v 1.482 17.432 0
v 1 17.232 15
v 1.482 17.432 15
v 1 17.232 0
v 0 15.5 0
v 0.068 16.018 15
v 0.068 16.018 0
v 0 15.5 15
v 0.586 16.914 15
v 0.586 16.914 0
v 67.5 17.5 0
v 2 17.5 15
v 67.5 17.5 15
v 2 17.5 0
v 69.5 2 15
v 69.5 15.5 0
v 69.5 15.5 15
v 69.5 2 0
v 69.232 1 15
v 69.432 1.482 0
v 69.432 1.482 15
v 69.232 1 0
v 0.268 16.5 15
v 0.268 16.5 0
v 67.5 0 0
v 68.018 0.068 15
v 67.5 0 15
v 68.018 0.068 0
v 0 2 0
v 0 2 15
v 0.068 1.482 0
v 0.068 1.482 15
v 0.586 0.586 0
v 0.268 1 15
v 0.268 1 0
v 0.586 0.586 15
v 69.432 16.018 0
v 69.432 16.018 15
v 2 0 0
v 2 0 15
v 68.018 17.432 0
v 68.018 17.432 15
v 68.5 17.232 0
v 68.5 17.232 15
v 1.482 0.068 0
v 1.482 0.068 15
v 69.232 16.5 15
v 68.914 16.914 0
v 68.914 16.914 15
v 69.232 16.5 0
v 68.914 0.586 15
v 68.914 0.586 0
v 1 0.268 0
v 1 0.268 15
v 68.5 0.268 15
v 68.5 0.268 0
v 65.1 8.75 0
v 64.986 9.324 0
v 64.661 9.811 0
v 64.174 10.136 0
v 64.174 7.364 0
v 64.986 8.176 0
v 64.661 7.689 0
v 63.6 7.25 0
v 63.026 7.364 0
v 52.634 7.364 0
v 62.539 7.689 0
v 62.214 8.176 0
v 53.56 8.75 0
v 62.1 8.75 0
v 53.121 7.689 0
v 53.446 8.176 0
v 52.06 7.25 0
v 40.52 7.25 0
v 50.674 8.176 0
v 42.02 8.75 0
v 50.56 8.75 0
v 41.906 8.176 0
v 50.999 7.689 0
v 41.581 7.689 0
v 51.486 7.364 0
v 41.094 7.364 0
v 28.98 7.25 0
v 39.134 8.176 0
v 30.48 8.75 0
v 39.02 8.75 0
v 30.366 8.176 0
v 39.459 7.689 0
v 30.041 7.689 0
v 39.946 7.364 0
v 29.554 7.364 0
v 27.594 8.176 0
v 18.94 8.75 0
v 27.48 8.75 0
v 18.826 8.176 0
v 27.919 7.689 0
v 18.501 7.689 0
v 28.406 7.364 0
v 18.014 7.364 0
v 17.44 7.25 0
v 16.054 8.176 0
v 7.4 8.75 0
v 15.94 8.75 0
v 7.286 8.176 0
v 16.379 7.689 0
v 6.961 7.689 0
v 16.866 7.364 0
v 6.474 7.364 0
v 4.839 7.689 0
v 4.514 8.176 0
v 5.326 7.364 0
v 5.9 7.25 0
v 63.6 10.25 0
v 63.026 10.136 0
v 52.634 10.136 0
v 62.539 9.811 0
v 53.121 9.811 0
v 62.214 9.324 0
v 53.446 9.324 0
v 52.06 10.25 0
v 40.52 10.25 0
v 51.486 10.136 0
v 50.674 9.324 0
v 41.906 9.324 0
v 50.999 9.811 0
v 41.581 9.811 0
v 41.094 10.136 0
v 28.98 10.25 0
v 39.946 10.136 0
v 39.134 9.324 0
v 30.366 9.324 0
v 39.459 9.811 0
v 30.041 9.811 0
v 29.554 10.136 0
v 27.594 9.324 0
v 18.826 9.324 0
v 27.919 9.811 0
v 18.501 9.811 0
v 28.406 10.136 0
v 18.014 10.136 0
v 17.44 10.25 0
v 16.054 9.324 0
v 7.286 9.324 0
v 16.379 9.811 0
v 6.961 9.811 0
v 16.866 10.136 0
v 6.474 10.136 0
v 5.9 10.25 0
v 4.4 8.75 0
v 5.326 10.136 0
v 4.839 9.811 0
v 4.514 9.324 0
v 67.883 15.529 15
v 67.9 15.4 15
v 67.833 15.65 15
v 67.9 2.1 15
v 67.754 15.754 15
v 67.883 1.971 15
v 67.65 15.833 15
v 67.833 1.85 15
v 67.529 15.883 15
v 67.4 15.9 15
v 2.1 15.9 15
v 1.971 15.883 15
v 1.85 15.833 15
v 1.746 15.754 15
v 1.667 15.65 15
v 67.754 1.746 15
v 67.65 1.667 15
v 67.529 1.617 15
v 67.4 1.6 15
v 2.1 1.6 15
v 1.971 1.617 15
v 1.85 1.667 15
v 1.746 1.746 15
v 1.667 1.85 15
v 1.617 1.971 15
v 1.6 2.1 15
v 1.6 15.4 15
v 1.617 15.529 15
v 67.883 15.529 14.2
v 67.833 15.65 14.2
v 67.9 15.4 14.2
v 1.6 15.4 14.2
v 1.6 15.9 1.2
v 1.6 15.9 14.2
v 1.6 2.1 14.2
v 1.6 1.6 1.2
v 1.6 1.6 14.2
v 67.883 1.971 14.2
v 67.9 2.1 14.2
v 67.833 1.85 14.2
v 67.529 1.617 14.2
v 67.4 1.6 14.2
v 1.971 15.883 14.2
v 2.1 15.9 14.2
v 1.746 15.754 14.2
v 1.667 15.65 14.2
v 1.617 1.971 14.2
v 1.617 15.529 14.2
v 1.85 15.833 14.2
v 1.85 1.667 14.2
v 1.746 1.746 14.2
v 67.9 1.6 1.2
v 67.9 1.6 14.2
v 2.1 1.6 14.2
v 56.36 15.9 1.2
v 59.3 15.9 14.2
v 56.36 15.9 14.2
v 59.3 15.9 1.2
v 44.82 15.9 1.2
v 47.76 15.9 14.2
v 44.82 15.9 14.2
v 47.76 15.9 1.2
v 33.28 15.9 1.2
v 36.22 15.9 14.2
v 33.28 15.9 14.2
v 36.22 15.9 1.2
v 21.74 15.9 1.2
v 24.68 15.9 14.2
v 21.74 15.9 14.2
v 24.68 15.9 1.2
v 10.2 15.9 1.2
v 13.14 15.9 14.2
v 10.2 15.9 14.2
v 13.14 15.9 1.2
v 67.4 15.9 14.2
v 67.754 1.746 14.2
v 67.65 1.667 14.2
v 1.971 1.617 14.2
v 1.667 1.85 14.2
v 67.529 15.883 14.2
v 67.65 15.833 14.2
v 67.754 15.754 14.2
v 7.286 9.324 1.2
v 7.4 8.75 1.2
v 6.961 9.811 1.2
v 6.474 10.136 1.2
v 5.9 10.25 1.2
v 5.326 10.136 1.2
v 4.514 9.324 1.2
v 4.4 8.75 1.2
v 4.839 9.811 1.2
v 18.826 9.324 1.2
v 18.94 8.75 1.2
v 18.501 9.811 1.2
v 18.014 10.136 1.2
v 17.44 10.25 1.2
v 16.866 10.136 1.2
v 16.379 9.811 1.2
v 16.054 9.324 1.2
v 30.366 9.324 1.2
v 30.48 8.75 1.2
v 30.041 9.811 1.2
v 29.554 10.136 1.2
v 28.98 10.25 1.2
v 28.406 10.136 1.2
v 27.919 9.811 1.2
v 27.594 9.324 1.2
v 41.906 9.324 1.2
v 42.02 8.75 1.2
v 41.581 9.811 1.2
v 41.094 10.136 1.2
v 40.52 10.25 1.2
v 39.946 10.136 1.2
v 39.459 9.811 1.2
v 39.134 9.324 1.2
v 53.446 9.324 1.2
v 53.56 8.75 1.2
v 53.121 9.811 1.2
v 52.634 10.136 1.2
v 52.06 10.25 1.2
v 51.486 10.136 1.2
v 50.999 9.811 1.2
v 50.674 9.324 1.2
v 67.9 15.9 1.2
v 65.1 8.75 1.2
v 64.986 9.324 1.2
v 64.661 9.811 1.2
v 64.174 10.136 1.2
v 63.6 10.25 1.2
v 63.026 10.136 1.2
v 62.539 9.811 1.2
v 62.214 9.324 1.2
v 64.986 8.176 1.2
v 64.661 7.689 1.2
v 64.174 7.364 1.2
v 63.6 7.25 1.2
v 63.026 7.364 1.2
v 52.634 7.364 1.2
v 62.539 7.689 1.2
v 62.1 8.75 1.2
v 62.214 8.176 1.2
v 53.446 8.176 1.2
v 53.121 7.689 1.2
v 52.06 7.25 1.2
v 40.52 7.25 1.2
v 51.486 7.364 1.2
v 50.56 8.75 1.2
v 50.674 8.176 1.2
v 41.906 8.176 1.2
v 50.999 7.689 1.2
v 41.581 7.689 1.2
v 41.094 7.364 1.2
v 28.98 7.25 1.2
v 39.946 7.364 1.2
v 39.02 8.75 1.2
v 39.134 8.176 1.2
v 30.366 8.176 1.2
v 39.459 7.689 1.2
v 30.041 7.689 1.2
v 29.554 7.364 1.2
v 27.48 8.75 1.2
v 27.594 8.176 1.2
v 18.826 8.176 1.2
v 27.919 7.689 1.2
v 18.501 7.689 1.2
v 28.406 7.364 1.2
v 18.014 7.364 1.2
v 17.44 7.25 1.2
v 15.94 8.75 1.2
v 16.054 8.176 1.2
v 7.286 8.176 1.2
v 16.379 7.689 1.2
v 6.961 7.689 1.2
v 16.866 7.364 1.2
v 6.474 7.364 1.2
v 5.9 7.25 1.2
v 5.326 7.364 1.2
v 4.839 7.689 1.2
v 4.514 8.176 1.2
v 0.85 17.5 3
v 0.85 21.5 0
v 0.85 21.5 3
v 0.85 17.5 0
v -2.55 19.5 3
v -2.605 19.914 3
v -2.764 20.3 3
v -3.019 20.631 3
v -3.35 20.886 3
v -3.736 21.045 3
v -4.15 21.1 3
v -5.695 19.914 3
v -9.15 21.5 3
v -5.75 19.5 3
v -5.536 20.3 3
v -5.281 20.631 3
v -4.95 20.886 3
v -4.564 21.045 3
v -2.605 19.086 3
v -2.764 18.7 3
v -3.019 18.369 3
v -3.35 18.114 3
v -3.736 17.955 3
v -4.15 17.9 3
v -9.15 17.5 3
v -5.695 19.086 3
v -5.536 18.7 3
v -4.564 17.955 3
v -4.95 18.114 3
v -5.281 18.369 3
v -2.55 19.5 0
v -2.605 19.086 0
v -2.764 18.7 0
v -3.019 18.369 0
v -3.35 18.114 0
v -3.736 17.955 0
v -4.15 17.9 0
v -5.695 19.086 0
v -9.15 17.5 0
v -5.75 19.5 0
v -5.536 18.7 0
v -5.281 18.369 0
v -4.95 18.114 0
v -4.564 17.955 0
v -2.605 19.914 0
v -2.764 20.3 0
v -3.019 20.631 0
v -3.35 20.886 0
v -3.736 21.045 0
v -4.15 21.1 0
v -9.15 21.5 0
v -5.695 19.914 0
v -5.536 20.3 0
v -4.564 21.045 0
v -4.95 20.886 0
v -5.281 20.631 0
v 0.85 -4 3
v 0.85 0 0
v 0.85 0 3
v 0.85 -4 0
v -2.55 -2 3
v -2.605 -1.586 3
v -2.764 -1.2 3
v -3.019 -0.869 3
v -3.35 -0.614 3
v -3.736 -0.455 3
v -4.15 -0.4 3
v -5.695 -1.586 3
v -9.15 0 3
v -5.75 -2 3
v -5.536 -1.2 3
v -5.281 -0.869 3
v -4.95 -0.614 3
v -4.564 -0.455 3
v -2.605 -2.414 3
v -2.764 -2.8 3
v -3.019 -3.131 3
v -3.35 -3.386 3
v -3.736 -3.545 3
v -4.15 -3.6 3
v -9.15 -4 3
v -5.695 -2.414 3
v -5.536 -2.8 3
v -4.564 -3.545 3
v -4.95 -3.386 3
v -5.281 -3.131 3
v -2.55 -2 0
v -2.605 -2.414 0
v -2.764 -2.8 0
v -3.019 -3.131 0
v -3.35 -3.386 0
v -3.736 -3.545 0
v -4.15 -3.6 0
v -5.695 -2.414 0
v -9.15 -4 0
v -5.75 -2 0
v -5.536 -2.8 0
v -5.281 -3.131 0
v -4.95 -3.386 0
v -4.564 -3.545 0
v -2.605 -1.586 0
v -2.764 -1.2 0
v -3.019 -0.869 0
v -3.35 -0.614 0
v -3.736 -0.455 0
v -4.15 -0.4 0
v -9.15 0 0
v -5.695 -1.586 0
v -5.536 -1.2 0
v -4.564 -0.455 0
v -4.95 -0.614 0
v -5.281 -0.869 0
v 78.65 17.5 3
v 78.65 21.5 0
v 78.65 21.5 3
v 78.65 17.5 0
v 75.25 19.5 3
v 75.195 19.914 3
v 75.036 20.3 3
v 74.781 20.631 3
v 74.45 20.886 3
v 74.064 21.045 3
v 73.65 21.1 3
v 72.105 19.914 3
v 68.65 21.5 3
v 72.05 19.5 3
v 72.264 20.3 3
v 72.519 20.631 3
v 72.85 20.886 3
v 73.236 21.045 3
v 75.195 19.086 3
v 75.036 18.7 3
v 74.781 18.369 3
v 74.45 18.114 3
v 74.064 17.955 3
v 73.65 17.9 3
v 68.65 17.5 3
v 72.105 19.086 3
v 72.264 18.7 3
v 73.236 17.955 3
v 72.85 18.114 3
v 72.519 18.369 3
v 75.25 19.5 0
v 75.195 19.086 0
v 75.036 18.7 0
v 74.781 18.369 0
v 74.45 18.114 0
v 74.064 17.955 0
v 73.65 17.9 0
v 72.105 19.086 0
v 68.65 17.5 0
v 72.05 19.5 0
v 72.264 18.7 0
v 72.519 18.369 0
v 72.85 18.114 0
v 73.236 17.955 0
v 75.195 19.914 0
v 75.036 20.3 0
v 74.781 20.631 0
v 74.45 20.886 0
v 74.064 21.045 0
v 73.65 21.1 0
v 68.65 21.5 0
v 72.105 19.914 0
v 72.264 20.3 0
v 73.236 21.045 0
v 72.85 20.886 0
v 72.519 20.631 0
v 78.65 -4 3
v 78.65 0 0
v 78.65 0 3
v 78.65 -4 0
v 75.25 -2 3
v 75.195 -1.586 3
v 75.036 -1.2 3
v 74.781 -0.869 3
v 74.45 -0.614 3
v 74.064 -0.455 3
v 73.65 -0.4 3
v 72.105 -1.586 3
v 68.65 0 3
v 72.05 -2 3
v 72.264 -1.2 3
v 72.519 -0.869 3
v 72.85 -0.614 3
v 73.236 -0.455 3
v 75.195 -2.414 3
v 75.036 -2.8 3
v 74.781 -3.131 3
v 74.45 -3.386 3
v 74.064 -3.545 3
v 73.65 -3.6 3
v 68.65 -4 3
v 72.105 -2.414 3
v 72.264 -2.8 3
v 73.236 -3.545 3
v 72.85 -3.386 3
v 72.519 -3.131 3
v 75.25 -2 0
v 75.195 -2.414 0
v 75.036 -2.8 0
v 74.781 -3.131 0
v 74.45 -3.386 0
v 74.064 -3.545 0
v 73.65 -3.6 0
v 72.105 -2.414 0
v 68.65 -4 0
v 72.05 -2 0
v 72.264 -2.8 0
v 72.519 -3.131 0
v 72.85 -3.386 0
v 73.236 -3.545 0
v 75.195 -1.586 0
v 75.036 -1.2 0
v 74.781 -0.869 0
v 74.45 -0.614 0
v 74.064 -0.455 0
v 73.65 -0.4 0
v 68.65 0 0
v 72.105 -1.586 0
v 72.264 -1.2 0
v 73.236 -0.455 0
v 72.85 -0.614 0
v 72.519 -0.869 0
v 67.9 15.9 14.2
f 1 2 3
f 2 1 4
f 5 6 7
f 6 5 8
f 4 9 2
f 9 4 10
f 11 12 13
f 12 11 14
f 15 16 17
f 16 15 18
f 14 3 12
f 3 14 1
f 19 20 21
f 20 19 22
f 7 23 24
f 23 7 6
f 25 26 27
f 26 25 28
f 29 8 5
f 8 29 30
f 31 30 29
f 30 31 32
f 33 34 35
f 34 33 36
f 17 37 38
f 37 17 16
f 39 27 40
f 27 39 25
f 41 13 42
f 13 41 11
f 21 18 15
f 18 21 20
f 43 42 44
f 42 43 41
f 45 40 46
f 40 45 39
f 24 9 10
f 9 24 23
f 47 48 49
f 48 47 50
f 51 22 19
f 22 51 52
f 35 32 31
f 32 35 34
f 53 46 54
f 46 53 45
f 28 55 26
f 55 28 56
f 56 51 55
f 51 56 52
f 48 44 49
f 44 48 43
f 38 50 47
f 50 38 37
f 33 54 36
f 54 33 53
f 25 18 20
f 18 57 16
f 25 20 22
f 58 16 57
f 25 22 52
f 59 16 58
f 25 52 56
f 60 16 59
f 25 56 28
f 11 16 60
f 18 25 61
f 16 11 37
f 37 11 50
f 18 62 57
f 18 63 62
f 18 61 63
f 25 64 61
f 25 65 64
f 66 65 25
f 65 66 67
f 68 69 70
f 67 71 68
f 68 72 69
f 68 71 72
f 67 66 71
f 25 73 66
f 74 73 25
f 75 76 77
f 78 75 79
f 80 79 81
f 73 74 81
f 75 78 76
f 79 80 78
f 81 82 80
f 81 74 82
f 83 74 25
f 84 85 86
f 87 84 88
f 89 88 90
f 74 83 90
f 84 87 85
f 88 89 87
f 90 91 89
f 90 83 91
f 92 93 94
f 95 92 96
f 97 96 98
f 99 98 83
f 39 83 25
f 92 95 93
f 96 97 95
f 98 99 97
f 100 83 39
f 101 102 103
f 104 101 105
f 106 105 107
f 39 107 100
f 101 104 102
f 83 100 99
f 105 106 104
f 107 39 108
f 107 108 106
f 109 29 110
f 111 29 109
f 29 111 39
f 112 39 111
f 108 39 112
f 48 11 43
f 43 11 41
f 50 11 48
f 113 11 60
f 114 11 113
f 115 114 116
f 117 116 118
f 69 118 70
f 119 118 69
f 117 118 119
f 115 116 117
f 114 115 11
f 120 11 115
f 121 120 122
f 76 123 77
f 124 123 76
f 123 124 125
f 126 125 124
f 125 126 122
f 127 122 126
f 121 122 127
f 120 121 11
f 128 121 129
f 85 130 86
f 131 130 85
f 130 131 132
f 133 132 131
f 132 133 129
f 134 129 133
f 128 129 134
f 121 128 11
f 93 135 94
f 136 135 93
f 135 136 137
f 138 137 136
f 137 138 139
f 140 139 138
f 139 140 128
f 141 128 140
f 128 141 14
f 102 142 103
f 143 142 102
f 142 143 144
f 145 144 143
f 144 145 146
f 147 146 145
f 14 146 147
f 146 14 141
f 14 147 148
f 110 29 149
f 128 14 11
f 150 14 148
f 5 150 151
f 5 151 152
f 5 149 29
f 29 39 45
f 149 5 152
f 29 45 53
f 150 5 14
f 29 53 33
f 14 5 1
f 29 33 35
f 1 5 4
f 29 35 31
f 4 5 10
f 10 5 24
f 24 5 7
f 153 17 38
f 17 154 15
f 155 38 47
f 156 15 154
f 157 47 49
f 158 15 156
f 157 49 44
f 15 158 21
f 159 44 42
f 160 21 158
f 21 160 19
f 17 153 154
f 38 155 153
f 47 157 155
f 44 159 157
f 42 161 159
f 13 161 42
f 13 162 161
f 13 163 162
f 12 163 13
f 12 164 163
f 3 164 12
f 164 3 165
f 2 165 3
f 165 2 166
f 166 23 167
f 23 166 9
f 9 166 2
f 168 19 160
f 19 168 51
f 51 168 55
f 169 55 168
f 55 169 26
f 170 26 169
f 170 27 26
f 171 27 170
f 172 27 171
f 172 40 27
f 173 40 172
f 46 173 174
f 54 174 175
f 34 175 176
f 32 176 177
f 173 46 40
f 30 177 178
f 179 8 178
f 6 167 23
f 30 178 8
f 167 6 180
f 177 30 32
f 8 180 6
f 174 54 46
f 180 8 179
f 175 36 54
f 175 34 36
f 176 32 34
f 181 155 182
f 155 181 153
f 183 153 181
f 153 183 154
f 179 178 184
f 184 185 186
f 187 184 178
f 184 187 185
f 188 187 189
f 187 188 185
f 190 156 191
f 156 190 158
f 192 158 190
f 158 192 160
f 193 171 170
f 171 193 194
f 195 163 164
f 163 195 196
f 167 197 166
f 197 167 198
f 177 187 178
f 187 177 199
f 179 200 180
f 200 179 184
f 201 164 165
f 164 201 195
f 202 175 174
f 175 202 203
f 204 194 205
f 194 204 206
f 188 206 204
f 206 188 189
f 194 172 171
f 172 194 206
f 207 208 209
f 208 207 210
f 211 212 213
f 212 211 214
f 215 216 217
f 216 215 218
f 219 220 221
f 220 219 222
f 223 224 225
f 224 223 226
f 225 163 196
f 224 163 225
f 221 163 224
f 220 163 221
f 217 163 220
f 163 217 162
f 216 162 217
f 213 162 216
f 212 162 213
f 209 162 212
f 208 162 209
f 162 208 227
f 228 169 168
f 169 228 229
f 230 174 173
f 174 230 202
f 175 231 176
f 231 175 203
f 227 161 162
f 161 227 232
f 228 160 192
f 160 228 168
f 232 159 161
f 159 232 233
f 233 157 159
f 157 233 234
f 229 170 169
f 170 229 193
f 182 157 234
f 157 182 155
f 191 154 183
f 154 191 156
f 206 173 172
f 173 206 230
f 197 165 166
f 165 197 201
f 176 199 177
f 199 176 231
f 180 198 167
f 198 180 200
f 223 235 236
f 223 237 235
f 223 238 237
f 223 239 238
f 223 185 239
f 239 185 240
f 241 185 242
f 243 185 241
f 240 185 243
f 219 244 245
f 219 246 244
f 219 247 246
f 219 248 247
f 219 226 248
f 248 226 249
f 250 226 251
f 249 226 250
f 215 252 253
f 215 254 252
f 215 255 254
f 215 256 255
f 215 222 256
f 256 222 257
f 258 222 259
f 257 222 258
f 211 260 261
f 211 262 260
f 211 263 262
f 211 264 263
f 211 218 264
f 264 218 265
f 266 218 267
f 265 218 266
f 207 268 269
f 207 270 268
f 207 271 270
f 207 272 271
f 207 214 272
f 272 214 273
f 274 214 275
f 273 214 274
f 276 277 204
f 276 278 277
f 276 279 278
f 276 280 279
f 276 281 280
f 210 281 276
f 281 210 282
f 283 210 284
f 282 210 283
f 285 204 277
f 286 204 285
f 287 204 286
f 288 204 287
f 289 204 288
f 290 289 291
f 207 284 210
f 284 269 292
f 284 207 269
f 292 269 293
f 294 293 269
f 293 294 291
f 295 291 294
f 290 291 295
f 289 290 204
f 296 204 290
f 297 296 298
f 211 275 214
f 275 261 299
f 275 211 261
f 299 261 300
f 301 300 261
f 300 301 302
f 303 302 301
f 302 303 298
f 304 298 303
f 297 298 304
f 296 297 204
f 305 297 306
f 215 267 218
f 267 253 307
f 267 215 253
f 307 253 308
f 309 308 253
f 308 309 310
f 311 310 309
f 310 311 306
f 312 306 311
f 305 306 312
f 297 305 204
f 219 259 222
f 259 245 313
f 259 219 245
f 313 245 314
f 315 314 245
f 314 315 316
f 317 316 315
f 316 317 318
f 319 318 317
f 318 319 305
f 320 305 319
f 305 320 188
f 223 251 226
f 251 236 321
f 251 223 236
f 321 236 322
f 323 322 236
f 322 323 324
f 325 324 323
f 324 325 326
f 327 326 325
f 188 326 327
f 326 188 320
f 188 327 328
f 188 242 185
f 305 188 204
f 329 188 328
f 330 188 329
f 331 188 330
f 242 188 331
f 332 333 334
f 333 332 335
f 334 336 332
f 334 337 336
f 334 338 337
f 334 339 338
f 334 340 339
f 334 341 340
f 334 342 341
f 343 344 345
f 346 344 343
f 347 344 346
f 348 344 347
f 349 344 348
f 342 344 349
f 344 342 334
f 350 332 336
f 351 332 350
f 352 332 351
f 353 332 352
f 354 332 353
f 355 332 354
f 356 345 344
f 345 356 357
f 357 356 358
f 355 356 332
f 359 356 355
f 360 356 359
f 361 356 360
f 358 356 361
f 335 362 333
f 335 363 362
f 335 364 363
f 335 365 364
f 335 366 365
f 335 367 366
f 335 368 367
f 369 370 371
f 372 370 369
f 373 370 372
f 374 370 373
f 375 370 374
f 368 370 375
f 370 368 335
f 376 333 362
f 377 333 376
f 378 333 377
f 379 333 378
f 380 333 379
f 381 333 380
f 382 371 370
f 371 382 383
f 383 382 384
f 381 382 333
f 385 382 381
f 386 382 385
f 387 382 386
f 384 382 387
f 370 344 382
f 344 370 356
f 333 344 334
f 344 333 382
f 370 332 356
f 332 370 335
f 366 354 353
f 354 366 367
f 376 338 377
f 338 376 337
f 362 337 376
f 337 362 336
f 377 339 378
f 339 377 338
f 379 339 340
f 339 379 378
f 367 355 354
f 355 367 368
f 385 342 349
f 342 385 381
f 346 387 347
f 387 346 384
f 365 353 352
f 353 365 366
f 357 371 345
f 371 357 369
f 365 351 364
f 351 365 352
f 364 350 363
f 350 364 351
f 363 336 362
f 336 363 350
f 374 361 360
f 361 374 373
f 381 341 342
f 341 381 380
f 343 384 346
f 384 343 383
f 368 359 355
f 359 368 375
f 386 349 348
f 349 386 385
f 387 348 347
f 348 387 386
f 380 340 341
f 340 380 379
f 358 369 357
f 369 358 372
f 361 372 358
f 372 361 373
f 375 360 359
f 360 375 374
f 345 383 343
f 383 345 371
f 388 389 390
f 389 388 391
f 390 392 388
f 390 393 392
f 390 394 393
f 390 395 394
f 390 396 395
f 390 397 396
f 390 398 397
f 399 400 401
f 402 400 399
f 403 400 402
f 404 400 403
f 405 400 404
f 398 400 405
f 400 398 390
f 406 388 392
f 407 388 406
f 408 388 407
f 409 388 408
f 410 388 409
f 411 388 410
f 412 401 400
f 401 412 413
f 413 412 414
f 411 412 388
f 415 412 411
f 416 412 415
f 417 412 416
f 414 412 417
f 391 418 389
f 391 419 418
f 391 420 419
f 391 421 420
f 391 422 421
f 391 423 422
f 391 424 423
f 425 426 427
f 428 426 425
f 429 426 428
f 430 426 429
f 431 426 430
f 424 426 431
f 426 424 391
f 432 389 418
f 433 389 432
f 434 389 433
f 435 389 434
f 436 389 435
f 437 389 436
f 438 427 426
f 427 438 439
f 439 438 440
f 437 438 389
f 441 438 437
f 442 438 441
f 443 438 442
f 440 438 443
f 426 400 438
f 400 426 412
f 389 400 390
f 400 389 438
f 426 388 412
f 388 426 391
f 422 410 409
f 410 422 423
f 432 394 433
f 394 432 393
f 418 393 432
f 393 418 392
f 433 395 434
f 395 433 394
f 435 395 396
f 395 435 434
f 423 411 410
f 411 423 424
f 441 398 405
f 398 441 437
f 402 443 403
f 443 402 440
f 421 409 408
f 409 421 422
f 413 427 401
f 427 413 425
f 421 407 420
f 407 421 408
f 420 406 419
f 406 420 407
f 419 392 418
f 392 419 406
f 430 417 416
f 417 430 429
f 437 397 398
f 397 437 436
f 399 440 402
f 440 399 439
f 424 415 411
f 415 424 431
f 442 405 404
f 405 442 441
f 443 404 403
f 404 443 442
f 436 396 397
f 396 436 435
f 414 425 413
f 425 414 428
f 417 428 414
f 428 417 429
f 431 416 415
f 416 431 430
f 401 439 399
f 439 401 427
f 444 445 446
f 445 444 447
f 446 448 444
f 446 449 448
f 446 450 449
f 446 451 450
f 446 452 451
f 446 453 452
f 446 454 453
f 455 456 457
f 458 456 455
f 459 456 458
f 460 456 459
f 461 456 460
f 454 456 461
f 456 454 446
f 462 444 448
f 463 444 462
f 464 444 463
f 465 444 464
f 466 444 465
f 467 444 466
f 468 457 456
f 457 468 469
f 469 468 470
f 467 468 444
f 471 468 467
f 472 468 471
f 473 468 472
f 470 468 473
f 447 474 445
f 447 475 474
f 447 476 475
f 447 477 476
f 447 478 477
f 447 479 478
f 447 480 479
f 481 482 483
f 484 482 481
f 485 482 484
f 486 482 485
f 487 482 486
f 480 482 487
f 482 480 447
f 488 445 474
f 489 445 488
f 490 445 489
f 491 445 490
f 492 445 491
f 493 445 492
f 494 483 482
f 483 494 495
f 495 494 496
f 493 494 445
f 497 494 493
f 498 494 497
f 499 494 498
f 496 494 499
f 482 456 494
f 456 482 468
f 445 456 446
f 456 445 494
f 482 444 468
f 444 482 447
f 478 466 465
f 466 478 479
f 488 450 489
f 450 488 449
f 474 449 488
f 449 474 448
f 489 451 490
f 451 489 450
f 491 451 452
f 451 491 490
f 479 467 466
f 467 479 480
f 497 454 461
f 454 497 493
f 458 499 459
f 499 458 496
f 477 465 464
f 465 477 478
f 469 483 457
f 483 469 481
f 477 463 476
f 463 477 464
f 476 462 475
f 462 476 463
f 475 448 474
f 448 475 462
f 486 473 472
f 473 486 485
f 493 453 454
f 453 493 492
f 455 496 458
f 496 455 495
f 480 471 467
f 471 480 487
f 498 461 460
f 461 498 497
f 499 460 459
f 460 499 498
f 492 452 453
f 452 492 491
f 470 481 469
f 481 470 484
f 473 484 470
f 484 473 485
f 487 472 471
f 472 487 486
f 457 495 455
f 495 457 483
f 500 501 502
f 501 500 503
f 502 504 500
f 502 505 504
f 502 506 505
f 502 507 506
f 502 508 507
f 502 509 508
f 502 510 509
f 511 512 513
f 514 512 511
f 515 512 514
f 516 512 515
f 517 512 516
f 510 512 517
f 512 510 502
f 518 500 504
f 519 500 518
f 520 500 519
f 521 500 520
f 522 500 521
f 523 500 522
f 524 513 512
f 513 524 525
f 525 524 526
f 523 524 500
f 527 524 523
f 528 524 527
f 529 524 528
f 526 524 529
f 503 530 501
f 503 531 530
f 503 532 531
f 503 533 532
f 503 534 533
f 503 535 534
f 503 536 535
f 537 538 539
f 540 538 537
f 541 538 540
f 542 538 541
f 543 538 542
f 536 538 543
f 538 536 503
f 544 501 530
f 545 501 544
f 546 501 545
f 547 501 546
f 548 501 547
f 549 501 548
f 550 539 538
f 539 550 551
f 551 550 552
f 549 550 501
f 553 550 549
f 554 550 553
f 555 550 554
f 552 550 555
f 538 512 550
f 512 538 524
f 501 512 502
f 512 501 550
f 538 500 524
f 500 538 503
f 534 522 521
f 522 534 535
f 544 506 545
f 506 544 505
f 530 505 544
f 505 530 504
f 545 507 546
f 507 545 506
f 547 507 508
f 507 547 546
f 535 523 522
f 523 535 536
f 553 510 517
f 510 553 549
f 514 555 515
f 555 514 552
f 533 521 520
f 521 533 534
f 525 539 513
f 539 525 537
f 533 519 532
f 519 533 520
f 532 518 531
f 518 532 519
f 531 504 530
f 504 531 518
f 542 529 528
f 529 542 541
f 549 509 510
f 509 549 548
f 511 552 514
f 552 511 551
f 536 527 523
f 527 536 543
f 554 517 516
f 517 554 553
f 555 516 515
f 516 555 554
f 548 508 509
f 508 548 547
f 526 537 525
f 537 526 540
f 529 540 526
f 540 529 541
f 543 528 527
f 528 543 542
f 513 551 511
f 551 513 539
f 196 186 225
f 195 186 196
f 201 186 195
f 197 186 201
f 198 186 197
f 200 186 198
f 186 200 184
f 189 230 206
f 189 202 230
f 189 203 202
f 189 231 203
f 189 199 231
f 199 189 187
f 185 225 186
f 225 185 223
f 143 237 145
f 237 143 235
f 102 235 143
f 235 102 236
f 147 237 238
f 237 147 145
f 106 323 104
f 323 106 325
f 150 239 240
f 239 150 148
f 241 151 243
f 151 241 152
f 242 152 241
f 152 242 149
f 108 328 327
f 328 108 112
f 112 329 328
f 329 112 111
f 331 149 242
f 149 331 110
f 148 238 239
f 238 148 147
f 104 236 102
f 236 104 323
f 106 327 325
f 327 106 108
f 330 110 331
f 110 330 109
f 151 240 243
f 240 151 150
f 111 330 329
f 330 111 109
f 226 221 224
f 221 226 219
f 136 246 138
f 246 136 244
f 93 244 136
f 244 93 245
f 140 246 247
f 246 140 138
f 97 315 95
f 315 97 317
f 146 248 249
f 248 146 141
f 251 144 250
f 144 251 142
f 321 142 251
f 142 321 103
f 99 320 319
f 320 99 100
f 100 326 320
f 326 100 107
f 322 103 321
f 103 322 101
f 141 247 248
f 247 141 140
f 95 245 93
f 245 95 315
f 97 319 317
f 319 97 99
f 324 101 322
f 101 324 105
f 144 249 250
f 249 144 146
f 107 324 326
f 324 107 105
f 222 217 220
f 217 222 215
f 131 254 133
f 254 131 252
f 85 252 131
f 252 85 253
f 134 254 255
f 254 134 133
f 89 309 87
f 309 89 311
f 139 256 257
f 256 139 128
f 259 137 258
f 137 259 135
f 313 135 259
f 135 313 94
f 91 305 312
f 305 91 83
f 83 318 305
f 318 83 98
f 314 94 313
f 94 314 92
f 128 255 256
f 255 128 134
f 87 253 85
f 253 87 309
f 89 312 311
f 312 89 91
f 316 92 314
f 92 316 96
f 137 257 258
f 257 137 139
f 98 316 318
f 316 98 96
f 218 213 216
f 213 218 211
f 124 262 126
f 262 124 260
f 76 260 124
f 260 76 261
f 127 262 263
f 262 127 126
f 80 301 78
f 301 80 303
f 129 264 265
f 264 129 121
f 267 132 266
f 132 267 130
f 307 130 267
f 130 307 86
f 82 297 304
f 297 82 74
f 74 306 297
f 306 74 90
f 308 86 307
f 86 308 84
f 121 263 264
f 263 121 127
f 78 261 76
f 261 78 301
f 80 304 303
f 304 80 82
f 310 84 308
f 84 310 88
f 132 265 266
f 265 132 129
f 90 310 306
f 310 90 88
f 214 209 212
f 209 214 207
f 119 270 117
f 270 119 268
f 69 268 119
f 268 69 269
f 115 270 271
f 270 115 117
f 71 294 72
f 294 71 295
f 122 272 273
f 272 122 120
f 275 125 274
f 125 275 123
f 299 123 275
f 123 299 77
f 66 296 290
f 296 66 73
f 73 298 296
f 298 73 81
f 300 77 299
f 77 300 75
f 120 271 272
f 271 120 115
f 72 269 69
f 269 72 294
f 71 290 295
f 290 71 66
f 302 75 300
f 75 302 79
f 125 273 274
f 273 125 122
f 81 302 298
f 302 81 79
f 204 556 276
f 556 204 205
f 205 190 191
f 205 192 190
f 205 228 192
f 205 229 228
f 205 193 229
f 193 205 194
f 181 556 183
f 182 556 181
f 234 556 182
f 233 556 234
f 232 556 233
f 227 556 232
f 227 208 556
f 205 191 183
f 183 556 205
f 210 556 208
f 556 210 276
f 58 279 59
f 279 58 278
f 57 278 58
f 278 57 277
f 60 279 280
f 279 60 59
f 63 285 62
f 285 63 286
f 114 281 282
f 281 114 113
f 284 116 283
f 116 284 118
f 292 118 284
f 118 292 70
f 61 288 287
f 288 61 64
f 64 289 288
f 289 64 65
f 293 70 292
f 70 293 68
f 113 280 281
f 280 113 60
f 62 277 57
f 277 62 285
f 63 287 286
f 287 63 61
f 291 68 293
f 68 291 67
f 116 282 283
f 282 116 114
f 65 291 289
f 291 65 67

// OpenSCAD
// Strat Single-Coil Pickup Enclosure for 6x Ubertar 77HC Single-String Pickups
// All dimensions in mm

// === ENCLOSURE OUTER DIMENSIONS (Standard Strat Single-Coil) ===
cover_length = 69.5;       // along strings direction
cover_width  = 17.5;       // across strings
cover_height = 15.0;       // total depth
wall_thickness = 1.6;      // shell wall thickness
bottom_thickness = 1.2;    // floor thickness

// === MOUNTING EARS ===
ear_length = 4.0;          // how far ears extend beyond cover body
ear_width  = 10.0;         // ear width (along cover_width axis)
ear_thickness = 3.0;       // ear height/thickness
screw_hole_dia = 3.2;      // #4 screw clearance
ear_spacing = 77.8;        // center-to-center between mounting holes

// === PICKUP SLOTS (adjust to your 77HC measurements) ===
num_pickups = 6;
pickup_width  = 8.0;       // each 77HC pickup body width — MEASURE AND ADJUST
pickup_height = 10.0;      // each 77HC pickup body height — MEASURE AND ADJUST
pickup_depth  = 12.0;      // how deep the pocket is (cover_height - bottom_thickness)
slot_tolerance = 0.3;      // clearance per side for fit

// === STRING SPACING ===
// Standard Strat: ~10.5mm at bridge, but 6 pickups must fit in cover_length
// Auto-calculated from cover_length and number of pickups
string_spacing = (cover_length - 2 * wall_thickness - pickup_width - 2 * slot_tolerance) / (num_pickups - 1);

// === WIRE CHANNEL ===
wire_channel_dia = 3.0;    // diameter of wire exit holes in bottom
wire_exit = "bottom";       // "bottom" or "side"

// === CORNER ROUNDING ===
corner_radius = 2.0;

// ============================================================
// MODULES
// ============================================================

module rounded_box(l, w, h, r) {
    hull() {
        for (x = [r, l - r])
            for (y = [r, w - r])
                translate([x, y, 0])
                    cylinder(h = h, r = r, $fn = 24);
    }
}

module enclosure_shell() {
    difference() {
        // Outer shell
        rounded_box(cover_length, cover_width, cover_height, corner_radius);

        // Hollow interior
        translate([wall_thickness, wall_thickness, bottom_thickness])
            rounded_box(
                cover_length - 2 * wall_thickness,
                cover_width  - 2 * wall_thickness,
                cover_height,  // cut through top
                max(corner_radius - wall_thickness, 0.5)
            );
    }
}

module pickup_slot(x_pos) {
    sw = pickup_width + 2 * slot_tolerance;
    sh = cover_width - 2 * wall_thickness;
    translate([x_pos - sw / 2, wall_thickness, bottom_thickness])
        cube([sw, sh, pickup_depth + 1]);  // +1 to cut through top
}

module wire_hole(x_pos) {
    if (wire_exit == "bottom") {
        translate([x_pos, cover_width / 2, -1])
            cylinder(d = wire_channel_dia, h = bottom_thickness + 2, $fn = 16);
    } else {
        // Side exit
        translate([x_pos, -1, bottom_thickness + pickup_depth / 2])
            rotate([-90, 0, 0])
                cylinder(d = wire_channel_dia, h = wall_thickness + 2, $fn = 16);
    }
}

module mounting_ear(x_pos) {
    // Ear pad
    translate([x_pos - ear_width / 2, cover_width, 0])
        difference() {
            cube([ear_width, ear_length, ear_thickness]);
            // Screw hole
            translate([ear_width / 2, ear_length / 2, -1])
                cylinder(d = screw_hole_dia, h = ear_thickness + 2, $fn = 24);
        }

    // Mirror on other side
    translate([x_pos - ear_width / 2, -ear_length, 0])
        difference() {
            cube([ear_width, ear_length, ear_thickness]);
            translate([ear_width / 2, ear_length / 2, -1])
                cylinder(d = screw_hole_dia, h = ear_thickness + 2, $fn = 24);
        }
}

module pickup_enclosure() {
    // Calculate first pickup X position (centered in cover)
    first_x = wall_thickness + (pickup_width / 2) + slot_tolerance;

    difference() {
        union() {
            enclosure_shell();

            // Mounting ears at standard spacing
            ear_x1 = cover_length / 2 - ear_spacing / 2;
            ear_x2 = cover_length / 2 + ear_spacing / 2;
            mounting_ear(ear_x1);
            mounting_ear(ear_x2);
        }

        // Cut pickup slots
        for (i = [0 : num_pickups - 1]) {
            x = first_x + i * string_spacing;
            pickup_slot(x);
            wire_hole(x);
        }
    }

    // Info echo
    echo(str("String spacing: ", string_spacing, " mm"));
    echo(str("Total slot width per pickup: ", pickup_width + 2 * slot_tolerance, " mm"));
}

// ============================================================
// RENDER
// ============================================================
pickup_enclosure();
